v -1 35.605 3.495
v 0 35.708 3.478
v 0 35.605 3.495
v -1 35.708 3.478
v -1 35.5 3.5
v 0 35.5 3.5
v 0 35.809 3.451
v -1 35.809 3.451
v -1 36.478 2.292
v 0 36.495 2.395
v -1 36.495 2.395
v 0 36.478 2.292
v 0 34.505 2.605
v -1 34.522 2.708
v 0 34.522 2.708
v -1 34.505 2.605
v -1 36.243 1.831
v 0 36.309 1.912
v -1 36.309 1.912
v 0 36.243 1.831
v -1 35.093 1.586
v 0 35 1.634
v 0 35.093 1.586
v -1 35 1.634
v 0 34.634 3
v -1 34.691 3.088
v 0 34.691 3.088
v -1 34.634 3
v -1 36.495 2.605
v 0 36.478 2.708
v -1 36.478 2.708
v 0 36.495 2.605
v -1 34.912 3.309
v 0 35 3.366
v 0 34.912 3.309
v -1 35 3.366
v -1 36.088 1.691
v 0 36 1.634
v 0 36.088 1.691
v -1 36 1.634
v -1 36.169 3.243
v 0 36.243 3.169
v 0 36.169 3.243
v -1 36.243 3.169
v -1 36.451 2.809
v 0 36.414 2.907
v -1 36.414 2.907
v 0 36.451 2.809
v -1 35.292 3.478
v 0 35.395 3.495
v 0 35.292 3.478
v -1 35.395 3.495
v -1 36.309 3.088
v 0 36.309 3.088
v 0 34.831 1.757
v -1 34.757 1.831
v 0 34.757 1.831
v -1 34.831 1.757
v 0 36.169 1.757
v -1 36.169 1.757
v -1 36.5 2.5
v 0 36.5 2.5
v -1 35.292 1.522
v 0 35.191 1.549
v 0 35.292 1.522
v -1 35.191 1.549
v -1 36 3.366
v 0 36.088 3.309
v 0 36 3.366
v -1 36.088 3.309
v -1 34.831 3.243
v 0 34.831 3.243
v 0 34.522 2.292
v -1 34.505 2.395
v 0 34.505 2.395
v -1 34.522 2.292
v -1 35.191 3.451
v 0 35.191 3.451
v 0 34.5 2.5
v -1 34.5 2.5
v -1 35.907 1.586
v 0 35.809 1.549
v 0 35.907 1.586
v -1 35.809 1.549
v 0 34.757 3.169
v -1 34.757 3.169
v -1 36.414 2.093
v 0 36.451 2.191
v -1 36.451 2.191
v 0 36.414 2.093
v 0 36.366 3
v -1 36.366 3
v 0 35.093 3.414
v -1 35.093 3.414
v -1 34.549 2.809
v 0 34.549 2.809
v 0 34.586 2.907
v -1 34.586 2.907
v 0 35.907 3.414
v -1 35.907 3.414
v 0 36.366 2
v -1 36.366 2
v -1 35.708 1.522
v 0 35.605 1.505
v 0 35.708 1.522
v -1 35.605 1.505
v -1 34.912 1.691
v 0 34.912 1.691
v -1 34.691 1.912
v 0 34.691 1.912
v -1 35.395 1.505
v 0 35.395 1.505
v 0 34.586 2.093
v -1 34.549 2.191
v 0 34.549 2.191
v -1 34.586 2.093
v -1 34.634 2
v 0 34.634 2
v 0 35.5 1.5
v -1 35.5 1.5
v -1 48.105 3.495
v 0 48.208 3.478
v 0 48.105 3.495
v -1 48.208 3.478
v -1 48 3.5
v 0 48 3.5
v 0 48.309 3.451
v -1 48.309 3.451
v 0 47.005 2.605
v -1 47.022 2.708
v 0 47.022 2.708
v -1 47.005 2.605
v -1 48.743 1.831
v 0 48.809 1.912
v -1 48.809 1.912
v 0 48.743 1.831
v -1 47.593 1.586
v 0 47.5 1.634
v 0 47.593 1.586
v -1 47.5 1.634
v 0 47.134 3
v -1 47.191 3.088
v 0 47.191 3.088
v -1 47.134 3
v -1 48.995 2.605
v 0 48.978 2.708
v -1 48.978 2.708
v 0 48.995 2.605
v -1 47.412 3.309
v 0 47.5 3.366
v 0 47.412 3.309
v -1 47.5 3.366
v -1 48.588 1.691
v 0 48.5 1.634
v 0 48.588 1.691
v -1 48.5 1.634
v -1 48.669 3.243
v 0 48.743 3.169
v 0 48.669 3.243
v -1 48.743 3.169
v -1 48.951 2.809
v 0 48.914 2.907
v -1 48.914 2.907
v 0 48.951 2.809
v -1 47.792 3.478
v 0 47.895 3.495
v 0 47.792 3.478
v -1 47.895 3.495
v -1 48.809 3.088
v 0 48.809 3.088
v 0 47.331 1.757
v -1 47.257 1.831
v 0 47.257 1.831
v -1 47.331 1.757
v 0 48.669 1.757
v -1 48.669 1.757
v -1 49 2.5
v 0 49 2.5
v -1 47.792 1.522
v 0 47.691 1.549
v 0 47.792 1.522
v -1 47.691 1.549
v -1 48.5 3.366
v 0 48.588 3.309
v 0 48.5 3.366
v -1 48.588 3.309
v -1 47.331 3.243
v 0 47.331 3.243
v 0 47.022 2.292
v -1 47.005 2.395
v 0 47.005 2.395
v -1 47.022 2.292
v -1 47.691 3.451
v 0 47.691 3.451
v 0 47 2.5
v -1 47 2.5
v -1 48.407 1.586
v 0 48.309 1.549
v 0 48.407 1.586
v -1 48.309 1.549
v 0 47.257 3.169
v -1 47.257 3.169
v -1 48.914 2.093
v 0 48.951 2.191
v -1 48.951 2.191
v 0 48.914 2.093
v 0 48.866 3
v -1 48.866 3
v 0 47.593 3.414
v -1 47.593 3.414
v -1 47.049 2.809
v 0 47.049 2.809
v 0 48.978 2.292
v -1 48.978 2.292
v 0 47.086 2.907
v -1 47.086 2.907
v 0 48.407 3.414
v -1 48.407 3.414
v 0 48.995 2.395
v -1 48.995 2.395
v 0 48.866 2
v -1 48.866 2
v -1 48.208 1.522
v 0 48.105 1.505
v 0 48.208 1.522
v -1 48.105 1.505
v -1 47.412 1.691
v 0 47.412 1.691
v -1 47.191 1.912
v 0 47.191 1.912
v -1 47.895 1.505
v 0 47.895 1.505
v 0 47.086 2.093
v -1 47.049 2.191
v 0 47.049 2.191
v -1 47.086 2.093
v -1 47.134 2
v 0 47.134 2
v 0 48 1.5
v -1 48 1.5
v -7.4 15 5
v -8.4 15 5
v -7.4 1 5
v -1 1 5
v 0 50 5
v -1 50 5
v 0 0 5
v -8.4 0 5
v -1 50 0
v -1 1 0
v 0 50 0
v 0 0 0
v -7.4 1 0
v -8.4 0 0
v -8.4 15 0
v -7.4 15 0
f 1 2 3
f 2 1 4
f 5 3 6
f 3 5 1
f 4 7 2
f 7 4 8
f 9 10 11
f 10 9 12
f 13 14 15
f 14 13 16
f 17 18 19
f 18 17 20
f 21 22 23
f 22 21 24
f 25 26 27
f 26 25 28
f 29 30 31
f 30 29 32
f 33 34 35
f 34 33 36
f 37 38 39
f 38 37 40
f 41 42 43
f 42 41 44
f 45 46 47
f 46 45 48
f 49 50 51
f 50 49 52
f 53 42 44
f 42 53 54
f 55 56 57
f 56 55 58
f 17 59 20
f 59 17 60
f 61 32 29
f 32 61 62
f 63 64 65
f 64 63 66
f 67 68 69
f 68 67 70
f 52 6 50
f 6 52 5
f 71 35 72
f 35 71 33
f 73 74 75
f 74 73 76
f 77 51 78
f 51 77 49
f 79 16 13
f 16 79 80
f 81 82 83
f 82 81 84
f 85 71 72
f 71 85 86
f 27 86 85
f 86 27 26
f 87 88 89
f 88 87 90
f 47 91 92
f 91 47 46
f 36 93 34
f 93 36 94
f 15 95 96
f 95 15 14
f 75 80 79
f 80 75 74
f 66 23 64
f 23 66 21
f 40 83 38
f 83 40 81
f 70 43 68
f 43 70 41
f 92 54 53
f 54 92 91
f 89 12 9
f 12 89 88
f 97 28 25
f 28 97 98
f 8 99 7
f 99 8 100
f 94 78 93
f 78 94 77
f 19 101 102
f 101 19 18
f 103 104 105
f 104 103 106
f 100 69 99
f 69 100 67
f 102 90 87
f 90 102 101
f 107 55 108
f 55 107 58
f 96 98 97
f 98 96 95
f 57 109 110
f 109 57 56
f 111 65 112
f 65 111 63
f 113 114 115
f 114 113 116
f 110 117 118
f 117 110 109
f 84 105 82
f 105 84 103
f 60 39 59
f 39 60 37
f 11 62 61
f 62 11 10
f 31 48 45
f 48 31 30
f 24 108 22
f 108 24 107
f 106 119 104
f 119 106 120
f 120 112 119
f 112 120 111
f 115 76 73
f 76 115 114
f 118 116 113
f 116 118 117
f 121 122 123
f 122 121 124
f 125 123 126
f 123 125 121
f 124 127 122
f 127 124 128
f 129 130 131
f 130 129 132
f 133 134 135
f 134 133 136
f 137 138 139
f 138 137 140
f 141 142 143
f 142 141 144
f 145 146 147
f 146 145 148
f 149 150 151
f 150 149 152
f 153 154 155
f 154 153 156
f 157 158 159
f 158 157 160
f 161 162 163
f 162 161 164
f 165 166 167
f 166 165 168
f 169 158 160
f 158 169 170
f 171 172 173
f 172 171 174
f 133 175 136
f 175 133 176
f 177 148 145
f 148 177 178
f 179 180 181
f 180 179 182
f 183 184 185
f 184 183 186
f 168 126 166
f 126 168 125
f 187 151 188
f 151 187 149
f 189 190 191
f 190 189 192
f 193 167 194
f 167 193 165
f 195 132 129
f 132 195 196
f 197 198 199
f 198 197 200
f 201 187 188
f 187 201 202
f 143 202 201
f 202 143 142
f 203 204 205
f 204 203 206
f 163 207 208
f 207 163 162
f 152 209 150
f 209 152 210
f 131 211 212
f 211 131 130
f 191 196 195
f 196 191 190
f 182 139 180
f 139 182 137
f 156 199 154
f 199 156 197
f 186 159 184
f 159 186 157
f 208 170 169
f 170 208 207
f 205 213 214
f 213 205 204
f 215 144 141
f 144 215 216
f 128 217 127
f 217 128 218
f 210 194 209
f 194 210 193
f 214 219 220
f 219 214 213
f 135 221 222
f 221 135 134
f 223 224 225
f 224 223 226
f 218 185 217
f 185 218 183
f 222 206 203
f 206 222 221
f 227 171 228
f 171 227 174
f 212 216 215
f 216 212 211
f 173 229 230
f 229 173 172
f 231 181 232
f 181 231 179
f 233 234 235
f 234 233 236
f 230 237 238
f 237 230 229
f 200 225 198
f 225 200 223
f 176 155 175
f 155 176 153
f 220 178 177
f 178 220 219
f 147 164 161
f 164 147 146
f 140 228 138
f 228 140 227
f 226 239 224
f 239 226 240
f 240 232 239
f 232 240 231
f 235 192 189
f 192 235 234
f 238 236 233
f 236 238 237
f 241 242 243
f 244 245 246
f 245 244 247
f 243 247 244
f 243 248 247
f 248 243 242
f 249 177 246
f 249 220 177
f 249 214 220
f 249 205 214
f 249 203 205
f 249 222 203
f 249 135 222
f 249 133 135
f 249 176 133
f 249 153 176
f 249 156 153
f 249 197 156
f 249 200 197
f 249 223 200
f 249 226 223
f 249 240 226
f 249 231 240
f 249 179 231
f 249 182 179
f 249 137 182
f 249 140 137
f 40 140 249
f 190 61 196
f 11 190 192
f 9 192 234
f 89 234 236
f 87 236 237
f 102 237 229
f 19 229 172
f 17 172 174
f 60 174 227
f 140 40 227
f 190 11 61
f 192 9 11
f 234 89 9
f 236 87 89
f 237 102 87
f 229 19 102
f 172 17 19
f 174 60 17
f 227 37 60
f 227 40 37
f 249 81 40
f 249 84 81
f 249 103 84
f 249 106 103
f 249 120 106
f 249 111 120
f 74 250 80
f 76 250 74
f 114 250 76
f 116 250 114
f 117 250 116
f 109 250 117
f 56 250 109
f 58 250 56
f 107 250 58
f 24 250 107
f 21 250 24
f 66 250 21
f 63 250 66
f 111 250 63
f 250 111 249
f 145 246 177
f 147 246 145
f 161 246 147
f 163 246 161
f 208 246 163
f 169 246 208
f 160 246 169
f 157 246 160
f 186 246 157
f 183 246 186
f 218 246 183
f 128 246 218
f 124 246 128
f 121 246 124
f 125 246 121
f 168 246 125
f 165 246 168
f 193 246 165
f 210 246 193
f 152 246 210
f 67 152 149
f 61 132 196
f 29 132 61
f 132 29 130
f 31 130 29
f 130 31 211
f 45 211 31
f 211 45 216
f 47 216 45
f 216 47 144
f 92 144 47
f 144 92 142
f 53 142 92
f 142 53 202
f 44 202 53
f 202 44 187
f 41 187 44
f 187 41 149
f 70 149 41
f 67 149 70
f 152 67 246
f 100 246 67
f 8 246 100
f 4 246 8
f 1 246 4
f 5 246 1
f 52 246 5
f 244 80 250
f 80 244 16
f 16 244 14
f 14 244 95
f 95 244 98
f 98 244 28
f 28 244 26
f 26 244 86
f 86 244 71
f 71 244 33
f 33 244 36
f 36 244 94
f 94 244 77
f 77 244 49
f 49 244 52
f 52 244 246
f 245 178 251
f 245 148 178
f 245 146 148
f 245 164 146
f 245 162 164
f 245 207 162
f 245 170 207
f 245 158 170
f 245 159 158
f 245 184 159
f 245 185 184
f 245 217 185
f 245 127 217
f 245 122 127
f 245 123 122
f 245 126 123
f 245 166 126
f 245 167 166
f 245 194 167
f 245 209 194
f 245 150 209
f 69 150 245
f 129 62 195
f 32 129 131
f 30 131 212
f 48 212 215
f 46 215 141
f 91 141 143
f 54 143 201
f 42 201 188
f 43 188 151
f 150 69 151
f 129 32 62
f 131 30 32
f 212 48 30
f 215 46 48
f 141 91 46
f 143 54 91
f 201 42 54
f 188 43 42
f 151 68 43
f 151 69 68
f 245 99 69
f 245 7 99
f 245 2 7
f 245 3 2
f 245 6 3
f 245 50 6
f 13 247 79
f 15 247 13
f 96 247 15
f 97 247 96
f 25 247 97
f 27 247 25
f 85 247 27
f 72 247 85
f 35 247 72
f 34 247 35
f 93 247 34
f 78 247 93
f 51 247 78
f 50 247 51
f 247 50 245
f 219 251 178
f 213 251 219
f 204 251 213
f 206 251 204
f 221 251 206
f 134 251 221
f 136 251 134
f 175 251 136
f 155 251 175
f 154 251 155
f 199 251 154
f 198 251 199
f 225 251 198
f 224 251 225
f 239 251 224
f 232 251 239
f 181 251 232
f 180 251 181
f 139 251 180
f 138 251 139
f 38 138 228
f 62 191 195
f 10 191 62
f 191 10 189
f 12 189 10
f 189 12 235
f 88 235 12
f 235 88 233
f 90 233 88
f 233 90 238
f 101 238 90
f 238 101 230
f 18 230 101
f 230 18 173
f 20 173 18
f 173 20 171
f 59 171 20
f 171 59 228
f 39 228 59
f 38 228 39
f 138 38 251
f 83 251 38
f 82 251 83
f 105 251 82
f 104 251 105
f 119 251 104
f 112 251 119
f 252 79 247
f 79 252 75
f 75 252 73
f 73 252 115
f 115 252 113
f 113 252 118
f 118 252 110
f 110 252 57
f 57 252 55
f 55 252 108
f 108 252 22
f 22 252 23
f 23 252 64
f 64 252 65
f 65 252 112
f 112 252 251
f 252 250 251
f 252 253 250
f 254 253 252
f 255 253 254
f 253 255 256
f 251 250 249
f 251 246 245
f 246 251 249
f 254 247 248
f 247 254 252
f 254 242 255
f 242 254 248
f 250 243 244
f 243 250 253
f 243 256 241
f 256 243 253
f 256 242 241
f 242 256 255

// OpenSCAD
rotate([0.0,-90.0,0.0])union(){
difference(){cube([5.0,50.0,1.0]);
union(){
translate([2.5,35.5,-0.5])
color([1.0,0.0,0.0])
cylinder(r=1.0,h=2.0,$fn=60);
translate([2.5,48.0,-0.5])
color([1.0,0.0,0.0])
cylinder(r=1.0,h=2.0,$fn=60);
}}
cube([5.0,1.0,8.4]);
translate([0.0,0.0,7.4])
cube([5.0,15.0,1.0]);
}
